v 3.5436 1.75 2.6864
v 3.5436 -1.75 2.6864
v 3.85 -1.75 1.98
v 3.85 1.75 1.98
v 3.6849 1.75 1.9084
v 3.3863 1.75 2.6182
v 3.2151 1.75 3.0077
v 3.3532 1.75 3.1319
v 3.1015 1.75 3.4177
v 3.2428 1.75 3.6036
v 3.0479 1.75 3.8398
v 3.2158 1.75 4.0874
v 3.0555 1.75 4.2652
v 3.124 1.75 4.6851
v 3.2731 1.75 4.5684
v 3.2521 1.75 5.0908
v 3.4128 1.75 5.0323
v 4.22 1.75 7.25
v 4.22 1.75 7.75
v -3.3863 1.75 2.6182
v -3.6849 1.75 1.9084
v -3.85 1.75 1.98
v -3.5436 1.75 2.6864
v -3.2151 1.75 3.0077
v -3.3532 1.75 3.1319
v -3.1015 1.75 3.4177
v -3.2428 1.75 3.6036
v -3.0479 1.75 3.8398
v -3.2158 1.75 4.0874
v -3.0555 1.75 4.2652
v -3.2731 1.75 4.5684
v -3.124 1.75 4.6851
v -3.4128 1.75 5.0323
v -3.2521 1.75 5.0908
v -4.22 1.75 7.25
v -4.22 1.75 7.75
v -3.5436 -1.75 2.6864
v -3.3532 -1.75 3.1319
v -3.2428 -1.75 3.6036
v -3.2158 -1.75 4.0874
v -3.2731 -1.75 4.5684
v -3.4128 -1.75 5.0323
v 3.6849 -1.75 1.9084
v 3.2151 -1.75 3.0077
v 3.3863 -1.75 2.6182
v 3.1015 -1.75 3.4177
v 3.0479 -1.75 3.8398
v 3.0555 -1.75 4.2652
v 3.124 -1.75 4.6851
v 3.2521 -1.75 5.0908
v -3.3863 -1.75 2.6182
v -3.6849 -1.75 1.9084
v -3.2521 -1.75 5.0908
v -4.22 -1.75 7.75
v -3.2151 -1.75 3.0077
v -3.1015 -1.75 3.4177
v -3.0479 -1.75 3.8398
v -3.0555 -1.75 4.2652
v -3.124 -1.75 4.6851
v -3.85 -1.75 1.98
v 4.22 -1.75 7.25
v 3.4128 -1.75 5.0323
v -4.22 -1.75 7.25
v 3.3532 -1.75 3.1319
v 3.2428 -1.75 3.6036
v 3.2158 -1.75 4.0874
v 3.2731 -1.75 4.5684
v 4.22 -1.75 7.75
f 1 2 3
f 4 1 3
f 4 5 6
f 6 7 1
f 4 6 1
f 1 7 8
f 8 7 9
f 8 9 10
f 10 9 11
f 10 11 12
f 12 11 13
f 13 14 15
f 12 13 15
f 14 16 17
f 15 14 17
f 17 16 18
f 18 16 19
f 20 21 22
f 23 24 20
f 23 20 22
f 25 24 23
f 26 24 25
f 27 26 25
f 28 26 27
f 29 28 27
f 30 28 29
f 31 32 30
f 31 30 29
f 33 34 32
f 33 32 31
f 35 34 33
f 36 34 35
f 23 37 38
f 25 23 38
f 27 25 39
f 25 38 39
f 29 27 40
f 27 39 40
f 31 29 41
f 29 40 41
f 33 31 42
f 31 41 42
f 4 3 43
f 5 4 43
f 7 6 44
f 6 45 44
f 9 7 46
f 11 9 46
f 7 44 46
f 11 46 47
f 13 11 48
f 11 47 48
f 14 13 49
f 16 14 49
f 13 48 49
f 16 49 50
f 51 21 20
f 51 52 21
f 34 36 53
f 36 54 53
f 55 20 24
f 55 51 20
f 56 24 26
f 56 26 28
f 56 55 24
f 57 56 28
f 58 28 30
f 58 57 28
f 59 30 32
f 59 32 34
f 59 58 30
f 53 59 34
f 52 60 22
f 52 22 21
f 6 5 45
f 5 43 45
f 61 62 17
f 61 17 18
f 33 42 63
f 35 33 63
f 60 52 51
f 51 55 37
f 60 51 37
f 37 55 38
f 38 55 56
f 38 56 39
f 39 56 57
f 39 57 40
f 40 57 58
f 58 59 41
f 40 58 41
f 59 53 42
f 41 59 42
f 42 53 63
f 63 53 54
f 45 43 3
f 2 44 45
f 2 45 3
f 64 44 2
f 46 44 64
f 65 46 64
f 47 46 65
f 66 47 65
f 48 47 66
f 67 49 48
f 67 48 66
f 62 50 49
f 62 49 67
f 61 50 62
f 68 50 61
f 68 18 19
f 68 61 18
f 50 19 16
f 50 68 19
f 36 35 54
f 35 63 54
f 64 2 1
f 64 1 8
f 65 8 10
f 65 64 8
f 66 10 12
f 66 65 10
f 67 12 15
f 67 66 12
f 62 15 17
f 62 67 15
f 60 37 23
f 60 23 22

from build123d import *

# Parameters (mm, degrees)
PAD002_DEPTH = 1.75


with BuildPart() as left_side_contact:
    # Sketch003 → Pad002 (new body, symmetric)
    with BuildSketch(Plane.XZ):
        with BuildLine():
            Line((-3.412832, 5.032325), (-4.22, 7.25))
            Line((-4.22, 7.25), (-4.22, 7.75))
            Line((-4.22, 7.75), (-3.252136, 5.090814))
            ThreePointArc((-3.386327, 2.618209), (-3.047888, 3.839786), (-3.252136, 5.090814))
            Line((-3.68486, 1.908385), (-3.386327, 2.618209))
            Line((-3.85, 1.98), (-3.68486, 1.908385))
            Line((-3.543646, 2.686433), (-3.85, 1.98))
            ThreePointArc((-3.543646, 2.686433), (-3.218799, 3.844912), (-3.412832, 5.032325))
        make_face()
    extrude(amount=PAD002_DEPTH, both=True)


with BuildPart() as side_contacts001:
    # Part__Mirroring: instance of left-side-contact
    add(left_side_contact.part.mirror(Plane(origin=(0, 0, 0), x_dir=(0, -1, 0), z_dir=(1, 0, 0))))

    # Fusion008: union left-side-contact
    add(left_side_contact.part)


solid = side_contacts001.part
